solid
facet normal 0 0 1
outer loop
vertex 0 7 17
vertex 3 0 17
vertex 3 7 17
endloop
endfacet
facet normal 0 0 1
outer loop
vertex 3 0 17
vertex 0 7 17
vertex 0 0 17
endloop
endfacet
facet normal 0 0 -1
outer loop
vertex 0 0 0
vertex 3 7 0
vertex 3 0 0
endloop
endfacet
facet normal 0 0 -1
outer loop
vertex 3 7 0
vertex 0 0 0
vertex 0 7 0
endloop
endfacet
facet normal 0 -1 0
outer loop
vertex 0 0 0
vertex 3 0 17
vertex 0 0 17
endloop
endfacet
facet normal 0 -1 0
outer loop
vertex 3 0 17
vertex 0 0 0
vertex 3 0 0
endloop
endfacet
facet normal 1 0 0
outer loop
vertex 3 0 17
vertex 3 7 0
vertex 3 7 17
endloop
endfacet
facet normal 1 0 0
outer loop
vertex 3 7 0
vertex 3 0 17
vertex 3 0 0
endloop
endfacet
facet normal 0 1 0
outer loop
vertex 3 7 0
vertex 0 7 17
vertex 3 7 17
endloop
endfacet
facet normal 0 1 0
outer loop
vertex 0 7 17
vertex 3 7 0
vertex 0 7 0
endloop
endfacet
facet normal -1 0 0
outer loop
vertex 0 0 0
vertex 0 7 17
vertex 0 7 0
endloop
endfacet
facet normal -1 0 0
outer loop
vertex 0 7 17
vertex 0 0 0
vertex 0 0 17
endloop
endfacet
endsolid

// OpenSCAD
// Generated by SolidPython 1.0.1 on 2020-07-29 00:39:26


cube(size = [3, 7, 17]);
/***********************************************
*********      SolidPython code:      **********
************************************************
 
# import packages: SolidPython
from solid import *
from solid.utils import *
from itertools import chain, combinations


class Resize:

    def __init__(self, scad_file):
        self.scad_file = scad_file
        #self.scad_file = import_scad(scad_file)
        # cone/cylinder param:
        self.r1 = 0
        self.r2 = 0
        self.h = 0
        # rectangular prism param:
        self.w = 0
        self.l = 0
        # ellipse param:
        self.r = 0

    # import OpenScad code (file name corresponds to shape)


    # classify shape + parameters
    def assign(self, param1, param2, param3):
        if self.scad_file == 'cone.scad':
            self.r1 = param1
            self.r2 = param2
            self.h = param3
        elif self.scad_file == 'cylinder.scad':
            self.r1 = param1
            self.r2 = param2
            self.h = param3
        elif self.scad_file == 'rectangularPrism.scad':
            self.h = param1
            self.l = param2
            self.w = param3
        else:
            self.r = param1
            self.h = param2

    # resize parameters
    def iterate(self):
        x = range(3, 20, 2)
        i = 1
        if self.scad_file == 'cone.scad':
            tempList = list(combinations(x, 2))
            for temp in tempList:
                param1 = temp[0]
                param2 = temp[1]
                filepath = 'produced_scad_files/' + 'cone' + str(param1) + '_' + str(param2) + '_' + '.scad'
                scad_render_to_file(cylinder(h=param1, r1=param2, r2=0), filepath)

        elif self.scad_file == 'cylinder.scad':
            tempList = list(combinations(x, 3))
            for temp in tempList:
                param1 = temp[0]
                param2 = temp[1]
                filepath = 'produced_scad_files/' + 'cylinder' + str(param1) + '_' + str(param2) + '_' + '.scad'
                scad_render_to_file(cylinder(h=param1, r1=param2, r2=param2), filepath)

        elif self.scad_file == 'rectangularPrism.scad':
            tempList = list(combinations(x, 3))
            for temp in tempList:
                param1 = temp[0]
                param2 = temp[1]
                param3 = temp[2]
                filepath = 'produced_scad_files/' + 'rectangularPrism' + str(param1) + '_' + str(param2) + '_' + str(
                    param3) + '.scad'
                scad_render_to_file(cube(size=(param1, param2, param3)), filepath)

        elif self.scad_file == 'ellipse.scad':
            tempList = list(combinations(x, 4))
            for temp in tempList:
                param1 = temp[0]
                param2 = temp[1]
                param3 = temp[2]
                param4 = temp[3]
                filepath = 'produced_scad_files/' + 'ellipse' + str(param1) + '_' + str(param2) + '_' + str(param3) + '_' + str(param4) + '.scad'
                scad_render_to_file(scale([param1, param2, param3])(sphere(r=param4)), filepath)

    def render_to_scadfile(self):
        scad_render_to_file(scad, 'example.scad') 
 
************************************************/
